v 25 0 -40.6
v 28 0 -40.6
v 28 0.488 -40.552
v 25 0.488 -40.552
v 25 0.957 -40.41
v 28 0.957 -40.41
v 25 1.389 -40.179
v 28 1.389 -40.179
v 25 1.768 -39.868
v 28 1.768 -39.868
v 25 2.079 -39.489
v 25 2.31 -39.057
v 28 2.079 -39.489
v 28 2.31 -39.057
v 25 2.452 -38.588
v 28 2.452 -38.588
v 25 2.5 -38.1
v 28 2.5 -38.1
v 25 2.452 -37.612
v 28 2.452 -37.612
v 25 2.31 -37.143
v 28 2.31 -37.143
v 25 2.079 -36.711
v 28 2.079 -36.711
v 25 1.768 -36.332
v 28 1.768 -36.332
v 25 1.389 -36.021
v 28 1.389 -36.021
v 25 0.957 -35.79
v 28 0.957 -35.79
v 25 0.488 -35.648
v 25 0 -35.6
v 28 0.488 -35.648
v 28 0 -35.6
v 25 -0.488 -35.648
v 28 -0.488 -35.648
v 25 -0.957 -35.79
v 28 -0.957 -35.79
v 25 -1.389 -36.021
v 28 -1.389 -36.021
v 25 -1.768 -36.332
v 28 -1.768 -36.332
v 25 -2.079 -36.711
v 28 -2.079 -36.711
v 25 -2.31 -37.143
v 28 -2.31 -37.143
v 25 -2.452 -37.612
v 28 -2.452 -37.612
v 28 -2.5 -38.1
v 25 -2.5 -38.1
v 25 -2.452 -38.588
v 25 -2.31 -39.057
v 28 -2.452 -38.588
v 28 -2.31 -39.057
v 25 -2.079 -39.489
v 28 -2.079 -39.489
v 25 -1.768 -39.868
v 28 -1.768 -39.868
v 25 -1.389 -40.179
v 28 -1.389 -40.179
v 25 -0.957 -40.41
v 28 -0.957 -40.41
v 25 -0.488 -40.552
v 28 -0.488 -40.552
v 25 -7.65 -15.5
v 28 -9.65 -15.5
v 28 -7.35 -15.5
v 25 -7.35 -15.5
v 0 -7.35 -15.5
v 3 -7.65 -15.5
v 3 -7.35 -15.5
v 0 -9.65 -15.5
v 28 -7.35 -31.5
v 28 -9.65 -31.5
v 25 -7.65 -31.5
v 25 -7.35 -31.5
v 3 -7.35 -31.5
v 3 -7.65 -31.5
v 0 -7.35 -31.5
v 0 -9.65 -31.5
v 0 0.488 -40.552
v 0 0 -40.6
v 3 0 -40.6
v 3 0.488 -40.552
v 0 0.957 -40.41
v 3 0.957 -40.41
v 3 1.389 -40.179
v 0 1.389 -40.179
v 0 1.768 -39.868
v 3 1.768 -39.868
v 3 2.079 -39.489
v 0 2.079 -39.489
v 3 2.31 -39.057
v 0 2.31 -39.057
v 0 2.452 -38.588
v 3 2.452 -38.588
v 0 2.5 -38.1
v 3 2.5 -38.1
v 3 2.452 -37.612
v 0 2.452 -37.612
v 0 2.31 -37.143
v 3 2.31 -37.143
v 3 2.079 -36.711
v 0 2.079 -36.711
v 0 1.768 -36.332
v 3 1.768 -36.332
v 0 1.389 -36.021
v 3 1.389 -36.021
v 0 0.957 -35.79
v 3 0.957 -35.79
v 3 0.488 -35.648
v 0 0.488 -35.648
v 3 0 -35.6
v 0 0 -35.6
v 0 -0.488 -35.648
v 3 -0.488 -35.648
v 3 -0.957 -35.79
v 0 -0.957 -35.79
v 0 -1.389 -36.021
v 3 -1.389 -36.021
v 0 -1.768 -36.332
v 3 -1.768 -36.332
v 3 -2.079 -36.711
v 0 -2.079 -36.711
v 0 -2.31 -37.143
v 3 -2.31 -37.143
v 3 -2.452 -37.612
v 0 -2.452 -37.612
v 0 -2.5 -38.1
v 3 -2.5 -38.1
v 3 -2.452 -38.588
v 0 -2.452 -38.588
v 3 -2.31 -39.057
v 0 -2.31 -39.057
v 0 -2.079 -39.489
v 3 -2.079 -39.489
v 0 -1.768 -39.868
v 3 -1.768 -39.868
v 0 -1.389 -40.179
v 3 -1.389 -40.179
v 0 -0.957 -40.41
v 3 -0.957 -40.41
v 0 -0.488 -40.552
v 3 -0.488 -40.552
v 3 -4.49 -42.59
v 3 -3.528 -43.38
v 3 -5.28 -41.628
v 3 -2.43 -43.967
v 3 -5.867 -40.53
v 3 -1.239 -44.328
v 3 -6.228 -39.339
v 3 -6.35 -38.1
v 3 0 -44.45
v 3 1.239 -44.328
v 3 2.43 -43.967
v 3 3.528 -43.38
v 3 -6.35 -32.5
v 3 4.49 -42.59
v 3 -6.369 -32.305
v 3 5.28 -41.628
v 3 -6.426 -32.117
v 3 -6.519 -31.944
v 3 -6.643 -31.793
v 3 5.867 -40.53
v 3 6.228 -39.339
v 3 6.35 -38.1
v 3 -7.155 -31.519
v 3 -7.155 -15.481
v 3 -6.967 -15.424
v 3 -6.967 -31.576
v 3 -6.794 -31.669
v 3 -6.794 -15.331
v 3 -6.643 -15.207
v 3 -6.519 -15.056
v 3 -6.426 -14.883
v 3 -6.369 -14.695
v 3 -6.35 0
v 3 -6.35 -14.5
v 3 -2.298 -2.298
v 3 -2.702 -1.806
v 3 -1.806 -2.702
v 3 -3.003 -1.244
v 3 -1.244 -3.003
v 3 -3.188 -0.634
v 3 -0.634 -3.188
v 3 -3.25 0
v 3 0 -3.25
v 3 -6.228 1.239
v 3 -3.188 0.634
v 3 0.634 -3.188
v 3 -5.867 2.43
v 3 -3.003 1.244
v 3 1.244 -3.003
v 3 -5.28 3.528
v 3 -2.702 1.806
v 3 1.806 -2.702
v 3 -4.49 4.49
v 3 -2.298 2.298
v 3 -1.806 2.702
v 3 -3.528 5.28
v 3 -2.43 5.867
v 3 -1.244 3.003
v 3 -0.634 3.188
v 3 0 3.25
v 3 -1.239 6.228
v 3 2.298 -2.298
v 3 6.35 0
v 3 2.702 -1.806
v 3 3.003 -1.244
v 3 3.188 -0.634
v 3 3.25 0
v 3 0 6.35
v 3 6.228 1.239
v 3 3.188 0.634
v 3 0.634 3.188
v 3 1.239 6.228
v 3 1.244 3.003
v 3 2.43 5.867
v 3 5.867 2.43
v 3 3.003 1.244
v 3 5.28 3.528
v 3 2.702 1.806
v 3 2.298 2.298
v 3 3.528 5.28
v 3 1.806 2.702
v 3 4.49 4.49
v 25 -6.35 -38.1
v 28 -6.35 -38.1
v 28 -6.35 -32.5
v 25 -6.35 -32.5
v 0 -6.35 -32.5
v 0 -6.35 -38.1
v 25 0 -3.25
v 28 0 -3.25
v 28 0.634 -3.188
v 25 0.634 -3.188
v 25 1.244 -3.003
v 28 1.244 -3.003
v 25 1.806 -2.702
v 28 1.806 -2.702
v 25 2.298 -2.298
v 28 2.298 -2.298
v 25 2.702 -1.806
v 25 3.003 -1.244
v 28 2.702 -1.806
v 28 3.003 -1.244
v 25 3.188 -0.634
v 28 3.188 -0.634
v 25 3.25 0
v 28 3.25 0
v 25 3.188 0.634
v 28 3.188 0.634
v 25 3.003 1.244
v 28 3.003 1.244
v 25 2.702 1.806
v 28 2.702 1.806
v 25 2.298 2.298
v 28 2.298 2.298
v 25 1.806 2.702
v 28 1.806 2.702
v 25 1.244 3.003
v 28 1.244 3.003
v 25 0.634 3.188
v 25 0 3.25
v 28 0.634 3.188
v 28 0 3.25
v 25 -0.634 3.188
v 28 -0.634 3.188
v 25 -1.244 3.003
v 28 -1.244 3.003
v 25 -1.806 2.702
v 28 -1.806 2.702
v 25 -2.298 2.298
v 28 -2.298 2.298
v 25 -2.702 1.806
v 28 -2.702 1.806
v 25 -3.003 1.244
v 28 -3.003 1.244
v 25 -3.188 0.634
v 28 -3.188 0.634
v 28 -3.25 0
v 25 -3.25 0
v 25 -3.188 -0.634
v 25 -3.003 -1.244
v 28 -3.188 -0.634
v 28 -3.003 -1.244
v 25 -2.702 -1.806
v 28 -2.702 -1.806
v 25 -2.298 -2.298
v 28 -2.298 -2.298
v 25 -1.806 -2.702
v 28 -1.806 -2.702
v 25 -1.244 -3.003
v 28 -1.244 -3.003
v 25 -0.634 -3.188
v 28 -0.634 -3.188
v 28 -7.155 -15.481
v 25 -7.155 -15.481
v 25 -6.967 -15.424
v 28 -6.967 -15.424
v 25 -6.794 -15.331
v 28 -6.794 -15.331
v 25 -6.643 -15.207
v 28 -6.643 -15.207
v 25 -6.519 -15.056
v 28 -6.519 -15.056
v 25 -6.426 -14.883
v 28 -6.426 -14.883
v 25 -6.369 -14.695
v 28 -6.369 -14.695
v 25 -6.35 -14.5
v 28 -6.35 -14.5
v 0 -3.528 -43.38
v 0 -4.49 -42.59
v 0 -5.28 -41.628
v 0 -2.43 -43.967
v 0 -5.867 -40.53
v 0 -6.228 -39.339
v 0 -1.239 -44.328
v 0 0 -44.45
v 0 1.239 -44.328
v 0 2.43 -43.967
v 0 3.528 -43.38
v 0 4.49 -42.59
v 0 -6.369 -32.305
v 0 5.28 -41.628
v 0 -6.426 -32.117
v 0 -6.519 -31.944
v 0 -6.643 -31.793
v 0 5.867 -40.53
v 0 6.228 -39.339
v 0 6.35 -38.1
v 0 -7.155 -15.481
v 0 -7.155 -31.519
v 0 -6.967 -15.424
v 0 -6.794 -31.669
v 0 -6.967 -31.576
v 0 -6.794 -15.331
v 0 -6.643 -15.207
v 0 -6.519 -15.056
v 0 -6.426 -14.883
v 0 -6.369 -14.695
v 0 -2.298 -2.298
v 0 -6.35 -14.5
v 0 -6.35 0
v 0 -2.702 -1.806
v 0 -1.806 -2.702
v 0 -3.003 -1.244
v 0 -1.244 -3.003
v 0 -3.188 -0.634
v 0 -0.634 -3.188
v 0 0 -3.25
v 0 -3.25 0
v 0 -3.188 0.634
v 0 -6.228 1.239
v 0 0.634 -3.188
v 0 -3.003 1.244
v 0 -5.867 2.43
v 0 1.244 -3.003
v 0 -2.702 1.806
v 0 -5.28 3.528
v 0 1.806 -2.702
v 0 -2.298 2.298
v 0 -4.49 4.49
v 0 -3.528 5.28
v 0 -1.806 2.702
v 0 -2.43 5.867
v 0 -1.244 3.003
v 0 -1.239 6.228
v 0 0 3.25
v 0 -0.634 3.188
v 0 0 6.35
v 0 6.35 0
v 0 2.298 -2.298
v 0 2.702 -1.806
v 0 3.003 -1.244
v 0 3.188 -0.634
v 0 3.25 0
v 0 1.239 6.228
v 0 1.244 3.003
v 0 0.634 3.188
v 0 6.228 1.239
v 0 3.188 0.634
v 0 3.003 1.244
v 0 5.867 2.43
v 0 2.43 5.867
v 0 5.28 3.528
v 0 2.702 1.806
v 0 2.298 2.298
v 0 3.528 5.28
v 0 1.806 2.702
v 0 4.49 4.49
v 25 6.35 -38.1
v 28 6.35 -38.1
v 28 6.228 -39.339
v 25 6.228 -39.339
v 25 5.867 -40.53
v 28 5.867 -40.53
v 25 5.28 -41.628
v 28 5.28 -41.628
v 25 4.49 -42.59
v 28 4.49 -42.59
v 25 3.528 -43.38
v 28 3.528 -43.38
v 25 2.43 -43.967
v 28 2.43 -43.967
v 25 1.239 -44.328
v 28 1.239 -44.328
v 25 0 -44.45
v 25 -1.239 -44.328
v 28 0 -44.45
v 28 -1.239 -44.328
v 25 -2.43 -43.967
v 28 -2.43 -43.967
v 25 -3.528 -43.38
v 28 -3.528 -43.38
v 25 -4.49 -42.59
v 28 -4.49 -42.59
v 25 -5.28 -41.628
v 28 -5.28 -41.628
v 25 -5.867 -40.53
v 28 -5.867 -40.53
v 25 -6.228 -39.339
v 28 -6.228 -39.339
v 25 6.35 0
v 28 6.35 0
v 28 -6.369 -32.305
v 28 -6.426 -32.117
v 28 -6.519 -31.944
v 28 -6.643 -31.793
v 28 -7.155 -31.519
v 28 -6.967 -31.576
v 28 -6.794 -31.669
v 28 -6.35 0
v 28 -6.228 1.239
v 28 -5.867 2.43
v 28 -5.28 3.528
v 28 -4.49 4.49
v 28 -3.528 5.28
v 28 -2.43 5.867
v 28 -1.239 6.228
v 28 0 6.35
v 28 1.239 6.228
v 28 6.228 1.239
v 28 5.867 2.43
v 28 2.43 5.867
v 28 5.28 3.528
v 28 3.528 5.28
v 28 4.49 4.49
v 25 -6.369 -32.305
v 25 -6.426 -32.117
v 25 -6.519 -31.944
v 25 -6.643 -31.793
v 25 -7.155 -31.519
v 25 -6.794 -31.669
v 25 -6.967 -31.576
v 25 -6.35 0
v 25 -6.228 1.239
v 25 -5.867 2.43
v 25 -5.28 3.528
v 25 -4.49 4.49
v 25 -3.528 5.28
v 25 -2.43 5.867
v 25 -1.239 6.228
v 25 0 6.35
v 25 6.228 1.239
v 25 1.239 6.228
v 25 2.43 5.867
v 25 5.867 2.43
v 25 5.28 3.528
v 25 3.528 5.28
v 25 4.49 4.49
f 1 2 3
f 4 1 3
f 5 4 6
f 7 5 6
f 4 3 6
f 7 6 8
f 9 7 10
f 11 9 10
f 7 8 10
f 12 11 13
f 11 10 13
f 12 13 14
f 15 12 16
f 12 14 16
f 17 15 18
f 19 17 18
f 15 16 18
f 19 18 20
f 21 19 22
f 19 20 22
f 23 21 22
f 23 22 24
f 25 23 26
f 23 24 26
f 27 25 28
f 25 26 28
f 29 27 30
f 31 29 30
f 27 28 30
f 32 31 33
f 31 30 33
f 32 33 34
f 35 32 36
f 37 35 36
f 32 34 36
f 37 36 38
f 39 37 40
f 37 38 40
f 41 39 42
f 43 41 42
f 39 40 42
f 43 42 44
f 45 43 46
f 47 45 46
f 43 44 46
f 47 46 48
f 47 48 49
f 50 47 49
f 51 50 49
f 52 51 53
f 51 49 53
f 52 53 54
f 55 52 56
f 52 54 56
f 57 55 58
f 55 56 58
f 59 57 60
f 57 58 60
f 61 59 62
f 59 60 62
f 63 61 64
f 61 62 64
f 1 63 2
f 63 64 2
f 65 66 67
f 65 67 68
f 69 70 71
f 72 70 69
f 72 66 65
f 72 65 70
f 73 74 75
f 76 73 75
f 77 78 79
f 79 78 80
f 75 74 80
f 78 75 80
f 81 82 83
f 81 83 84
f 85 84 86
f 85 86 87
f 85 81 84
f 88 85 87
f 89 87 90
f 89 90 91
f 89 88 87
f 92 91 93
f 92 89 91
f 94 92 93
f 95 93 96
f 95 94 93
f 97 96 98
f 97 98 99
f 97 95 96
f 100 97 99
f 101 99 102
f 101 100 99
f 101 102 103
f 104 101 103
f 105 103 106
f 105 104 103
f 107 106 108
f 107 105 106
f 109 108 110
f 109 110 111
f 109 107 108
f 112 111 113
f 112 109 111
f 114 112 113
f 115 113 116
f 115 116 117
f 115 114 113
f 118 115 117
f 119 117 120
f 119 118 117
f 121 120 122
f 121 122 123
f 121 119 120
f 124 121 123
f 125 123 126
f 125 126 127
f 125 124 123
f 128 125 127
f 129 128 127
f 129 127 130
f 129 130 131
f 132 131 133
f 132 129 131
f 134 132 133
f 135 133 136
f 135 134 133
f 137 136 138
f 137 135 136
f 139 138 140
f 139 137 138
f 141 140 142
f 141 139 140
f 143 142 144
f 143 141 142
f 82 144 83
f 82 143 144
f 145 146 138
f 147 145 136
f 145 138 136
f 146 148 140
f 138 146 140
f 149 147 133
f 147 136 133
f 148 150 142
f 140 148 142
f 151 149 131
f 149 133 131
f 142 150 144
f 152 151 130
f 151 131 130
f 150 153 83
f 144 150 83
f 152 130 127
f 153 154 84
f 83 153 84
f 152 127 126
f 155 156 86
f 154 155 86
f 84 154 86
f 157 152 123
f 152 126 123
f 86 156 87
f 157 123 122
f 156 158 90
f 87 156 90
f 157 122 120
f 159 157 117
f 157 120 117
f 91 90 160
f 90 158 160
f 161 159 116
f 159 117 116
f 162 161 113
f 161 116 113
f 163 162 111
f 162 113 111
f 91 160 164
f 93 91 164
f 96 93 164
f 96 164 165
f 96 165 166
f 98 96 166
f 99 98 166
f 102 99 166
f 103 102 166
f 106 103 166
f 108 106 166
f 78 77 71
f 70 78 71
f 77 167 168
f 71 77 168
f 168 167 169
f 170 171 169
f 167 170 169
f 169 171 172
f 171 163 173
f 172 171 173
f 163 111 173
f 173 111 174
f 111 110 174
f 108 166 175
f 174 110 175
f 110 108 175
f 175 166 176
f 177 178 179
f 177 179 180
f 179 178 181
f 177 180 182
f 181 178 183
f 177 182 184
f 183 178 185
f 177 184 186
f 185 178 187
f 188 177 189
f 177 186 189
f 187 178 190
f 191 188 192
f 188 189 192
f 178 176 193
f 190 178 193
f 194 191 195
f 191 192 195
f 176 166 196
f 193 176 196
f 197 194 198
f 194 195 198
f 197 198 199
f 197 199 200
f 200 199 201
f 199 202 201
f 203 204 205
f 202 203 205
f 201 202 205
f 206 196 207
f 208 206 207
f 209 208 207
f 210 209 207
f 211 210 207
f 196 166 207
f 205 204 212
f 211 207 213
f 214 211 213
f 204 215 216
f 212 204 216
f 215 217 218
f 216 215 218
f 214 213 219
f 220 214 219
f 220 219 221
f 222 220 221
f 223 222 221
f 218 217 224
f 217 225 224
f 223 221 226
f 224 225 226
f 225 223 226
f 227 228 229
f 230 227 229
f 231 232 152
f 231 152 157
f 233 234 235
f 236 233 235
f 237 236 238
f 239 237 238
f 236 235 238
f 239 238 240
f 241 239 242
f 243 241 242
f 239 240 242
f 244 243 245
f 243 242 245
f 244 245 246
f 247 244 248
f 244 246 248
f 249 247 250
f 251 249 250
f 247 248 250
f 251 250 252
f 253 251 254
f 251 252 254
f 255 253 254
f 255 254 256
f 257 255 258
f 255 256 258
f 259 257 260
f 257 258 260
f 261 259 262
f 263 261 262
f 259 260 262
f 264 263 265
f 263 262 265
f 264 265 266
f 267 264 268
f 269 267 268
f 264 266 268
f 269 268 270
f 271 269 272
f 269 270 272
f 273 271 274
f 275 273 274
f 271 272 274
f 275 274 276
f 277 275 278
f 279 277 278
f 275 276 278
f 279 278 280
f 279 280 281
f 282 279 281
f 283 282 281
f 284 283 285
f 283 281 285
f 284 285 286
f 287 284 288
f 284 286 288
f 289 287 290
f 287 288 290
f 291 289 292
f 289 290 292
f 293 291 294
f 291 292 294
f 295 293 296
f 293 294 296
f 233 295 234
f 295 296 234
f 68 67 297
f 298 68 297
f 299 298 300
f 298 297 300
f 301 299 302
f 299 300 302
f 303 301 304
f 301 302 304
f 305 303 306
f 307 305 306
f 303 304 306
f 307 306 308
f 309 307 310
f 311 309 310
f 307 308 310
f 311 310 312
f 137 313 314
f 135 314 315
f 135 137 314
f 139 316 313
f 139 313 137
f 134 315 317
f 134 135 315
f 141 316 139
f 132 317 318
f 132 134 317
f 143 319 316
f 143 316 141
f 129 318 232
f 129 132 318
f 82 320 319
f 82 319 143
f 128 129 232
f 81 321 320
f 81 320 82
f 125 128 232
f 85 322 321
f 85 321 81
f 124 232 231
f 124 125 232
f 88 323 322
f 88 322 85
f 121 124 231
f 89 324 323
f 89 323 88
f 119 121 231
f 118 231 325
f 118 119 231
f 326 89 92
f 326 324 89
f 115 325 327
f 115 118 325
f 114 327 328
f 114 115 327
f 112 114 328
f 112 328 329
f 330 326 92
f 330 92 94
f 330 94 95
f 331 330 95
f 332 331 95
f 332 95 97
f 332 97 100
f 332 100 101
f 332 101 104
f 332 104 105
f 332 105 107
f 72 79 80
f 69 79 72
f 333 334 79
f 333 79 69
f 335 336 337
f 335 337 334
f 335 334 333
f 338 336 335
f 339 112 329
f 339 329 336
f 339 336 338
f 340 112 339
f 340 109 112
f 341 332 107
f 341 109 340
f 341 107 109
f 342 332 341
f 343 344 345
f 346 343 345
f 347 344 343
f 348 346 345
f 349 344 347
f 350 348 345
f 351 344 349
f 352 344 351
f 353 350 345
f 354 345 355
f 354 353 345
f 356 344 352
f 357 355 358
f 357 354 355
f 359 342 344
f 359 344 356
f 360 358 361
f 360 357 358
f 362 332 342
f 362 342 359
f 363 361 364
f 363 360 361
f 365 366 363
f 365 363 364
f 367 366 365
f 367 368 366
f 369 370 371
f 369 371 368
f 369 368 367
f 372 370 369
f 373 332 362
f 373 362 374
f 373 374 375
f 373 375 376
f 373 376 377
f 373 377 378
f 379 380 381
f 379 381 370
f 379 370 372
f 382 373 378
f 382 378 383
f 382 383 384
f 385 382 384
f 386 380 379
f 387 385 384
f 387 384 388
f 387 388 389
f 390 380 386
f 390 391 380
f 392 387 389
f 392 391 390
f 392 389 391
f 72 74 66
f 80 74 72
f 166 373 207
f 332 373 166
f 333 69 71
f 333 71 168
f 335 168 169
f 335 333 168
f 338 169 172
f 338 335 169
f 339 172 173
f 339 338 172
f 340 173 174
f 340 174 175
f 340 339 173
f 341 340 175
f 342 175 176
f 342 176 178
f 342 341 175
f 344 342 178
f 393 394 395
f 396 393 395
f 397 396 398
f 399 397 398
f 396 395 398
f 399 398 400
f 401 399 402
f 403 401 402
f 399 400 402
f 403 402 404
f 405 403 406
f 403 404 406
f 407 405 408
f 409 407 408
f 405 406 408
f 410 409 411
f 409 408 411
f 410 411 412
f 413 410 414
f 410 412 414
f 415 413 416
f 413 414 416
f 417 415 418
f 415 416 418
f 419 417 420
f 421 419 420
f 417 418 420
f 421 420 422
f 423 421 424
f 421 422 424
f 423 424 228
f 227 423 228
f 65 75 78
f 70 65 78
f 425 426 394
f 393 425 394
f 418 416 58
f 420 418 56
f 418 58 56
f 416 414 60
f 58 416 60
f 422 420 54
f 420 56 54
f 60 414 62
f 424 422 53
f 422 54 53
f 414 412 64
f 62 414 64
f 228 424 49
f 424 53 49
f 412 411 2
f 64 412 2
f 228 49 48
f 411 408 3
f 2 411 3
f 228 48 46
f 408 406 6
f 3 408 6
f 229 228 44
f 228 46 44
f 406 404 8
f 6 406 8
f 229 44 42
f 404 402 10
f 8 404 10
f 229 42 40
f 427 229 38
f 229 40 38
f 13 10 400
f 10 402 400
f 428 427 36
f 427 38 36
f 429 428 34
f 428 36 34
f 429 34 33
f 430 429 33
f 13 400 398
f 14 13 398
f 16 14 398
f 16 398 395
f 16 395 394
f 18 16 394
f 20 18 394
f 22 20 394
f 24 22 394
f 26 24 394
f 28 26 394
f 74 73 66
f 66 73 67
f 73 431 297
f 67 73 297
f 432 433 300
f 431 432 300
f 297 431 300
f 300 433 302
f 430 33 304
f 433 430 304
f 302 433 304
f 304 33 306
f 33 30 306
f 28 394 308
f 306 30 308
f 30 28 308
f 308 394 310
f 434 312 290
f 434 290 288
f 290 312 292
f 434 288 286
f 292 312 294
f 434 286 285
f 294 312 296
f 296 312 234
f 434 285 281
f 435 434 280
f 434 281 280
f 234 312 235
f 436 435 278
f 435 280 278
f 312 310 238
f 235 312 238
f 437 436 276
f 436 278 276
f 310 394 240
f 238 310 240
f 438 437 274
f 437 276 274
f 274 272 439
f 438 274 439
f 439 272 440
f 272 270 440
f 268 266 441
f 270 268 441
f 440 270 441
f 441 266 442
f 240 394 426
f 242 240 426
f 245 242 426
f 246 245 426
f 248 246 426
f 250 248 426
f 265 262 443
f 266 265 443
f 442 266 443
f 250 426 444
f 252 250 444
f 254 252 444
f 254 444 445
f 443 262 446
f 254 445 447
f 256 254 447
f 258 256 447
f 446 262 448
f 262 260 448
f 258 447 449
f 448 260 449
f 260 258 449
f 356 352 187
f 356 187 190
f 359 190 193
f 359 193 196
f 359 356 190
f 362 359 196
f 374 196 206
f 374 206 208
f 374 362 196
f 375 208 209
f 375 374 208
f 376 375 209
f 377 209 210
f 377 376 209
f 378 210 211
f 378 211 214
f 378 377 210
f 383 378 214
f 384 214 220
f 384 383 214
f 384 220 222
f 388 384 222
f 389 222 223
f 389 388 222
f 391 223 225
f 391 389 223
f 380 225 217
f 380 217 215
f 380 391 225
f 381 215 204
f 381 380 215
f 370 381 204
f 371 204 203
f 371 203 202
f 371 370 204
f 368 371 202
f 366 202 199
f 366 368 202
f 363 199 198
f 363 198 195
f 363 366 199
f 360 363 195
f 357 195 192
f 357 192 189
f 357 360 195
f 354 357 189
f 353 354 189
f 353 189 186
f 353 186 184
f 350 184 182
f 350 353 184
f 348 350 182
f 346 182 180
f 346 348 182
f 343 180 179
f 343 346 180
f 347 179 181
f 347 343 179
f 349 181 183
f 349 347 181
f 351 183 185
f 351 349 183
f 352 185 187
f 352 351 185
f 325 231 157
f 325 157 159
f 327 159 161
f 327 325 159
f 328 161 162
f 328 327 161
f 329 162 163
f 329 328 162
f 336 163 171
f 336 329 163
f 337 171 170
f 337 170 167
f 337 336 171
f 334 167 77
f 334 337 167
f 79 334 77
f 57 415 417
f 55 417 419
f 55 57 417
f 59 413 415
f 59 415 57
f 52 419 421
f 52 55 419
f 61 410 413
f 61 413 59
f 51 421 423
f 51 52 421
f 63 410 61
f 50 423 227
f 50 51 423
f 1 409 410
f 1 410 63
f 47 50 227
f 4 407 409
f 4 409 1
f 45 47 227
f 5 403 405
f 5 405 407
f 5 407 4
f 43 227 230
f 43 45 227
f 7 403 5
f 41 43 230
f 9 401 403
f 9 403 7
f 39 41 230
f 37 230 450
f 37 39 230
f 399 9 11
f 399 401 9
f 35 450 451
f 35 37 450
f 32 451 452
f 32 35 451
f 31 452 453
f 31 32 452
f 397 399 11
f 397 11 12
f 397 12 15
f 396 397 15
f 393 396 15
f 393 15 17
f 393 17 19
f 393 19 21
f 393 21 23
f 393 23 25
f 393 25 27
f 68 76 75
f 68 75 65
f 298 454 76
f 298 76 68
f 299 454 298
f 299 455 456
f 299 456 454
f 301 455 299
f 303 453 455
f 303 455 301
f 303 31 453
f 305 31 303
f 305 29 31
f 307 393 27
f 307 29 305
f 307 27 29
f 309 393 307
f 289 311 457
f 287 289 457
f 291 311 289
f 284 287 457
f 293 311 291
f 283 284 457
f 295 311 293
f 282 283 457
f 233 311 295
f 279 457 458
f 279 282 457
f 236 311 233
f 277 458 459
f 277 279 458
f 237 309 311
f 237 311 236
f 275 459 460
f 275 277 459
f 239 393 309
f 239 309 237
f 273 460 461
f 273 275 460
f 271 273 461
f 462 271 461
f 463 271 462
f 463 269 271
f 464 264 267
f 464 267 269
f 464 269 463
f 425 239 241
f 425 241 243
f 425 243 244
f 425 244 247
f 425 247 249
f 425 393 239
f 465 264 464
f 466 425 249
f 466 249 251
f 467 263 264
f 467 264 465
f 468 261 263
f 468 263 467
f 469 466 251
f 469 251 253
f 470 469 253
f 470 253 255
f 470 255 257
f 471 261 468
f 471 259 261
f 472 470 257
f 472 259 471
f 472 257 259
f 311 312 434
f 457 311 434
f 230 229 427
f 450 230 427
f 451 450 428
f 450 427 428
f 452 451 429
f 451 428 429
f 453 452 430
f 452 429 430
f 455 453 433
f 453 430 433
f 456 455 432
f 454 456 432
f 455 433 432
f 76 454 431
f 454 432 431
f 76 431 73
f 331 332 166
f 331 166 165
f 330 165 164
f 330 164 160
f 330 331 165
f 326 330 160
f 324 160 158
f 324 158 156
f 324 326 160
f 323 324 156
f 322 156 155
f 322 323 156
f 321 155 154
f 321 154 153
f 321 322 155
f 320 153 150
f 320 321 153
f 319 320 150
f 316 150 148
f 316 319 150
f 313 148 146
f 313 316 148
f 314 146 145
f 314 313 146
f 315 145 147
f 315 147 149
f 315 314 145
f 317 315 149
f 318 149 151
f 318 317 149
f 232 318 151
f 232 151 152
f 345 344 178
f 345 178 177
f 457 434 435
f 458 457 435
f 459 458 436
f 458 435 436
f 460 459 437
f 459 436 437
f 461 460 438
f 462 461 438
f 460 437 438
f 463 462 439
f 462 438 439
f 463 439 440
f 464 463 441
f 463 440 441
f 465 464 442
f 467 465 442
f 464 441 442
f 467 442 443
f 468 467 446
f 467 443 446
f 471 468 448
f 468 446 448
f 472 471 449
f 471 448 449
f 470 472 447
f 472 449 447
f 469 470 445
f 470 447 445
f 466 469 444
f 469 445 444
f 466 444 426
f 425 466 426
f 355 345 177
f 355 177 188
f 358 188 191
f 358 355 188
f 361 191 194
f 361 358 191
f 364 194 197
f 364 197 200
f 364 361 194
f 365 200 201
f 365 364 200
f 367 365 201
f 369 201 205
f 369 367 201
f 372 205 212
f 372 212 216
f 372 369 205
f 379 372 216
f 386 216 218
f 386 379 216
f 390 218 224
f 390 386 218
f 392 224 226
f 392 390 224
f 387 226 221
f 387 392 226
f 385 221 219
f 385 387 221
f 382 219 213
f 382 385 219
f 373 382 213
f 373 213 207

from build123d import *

# Parameters (mm, degrees)
SKETCH1_R           = 3.25
SKETCH1_R_2         = 2.5
BOSS_EXTRUDE1_DEPTH = 3
BOSS_EXTRUDE2_START = -9.65
SKETCH2_W           = 11
SKETCH2_H           = 16
BOSS_EXTRUDE2_DEPTH = 2


with BuildPart() as part:
    # Sketch1 → Boss-Extrude1 (new body)
    with BuildSketch(Plane(origin=(0, 0, 0), x_dir=(0, 0, -1), z_dir=(1, 0, 0))):
        with BuildLine():
            Line((0, 6.35), (38.1, 6.35))
            ThreePointArc((38.1, 6.35), (44.45, 0), (38.1, -6.35))
            Line((38.1, -6.35), (32.5, -6.35))
            ThreePointArc((32.5, -6.35), (31.792893219, -6.642893219), (31.5, -7.35))
            Line((31.5, -7.35), (31.5, -9.65))
            Line((31.5, -9.65), (15.5, -9.65))
            Line((15.5, -9.65), (15.5, -7.35))
            ThreePointArc((15.5, -7.35), (15.207106781, -6.642893219), (14.5, -6.35))
            Line((14.5, -6.35), (0, -6.35))
            ThreePointArc((0, -6.35), (-6.35, 0), (0, 6.35))
        make_face()
        Circle(SKETCH1_R, mode=Mode.SUBTRACT)
        with Locations((38.1, 0)):
            Circle(SKETCH1_R_2, mode=Mode.SUBTRACT)
    extrude(amount=BOSS_EXTRUDE1_DEPTH)

    # Sketch2 → Boss-Extrude2 (add)
    with BuildSketch(Plane(origin=(0, 0, 0), x_dir=(1, 0, 0), z_dir=(0, 1, 0)).offset(BOSS_EXTRUDE2_START)):
        with Locations((8.5, 23.5)):
            Rectangle(SKETCH2_W, SKETCH2_H)
    extrude(amount=BOSS_EXTRUDE2_DEPTH)

    # Mirror2: part across plane


with BuildPart() as part_1:
    add(part.part)
    add(part.part.mirror(Plane(origin=(14, 0, 0), x_dir=(0, 0, 1), z_dir=(1, 0, 0))))


solid = part_1.part
